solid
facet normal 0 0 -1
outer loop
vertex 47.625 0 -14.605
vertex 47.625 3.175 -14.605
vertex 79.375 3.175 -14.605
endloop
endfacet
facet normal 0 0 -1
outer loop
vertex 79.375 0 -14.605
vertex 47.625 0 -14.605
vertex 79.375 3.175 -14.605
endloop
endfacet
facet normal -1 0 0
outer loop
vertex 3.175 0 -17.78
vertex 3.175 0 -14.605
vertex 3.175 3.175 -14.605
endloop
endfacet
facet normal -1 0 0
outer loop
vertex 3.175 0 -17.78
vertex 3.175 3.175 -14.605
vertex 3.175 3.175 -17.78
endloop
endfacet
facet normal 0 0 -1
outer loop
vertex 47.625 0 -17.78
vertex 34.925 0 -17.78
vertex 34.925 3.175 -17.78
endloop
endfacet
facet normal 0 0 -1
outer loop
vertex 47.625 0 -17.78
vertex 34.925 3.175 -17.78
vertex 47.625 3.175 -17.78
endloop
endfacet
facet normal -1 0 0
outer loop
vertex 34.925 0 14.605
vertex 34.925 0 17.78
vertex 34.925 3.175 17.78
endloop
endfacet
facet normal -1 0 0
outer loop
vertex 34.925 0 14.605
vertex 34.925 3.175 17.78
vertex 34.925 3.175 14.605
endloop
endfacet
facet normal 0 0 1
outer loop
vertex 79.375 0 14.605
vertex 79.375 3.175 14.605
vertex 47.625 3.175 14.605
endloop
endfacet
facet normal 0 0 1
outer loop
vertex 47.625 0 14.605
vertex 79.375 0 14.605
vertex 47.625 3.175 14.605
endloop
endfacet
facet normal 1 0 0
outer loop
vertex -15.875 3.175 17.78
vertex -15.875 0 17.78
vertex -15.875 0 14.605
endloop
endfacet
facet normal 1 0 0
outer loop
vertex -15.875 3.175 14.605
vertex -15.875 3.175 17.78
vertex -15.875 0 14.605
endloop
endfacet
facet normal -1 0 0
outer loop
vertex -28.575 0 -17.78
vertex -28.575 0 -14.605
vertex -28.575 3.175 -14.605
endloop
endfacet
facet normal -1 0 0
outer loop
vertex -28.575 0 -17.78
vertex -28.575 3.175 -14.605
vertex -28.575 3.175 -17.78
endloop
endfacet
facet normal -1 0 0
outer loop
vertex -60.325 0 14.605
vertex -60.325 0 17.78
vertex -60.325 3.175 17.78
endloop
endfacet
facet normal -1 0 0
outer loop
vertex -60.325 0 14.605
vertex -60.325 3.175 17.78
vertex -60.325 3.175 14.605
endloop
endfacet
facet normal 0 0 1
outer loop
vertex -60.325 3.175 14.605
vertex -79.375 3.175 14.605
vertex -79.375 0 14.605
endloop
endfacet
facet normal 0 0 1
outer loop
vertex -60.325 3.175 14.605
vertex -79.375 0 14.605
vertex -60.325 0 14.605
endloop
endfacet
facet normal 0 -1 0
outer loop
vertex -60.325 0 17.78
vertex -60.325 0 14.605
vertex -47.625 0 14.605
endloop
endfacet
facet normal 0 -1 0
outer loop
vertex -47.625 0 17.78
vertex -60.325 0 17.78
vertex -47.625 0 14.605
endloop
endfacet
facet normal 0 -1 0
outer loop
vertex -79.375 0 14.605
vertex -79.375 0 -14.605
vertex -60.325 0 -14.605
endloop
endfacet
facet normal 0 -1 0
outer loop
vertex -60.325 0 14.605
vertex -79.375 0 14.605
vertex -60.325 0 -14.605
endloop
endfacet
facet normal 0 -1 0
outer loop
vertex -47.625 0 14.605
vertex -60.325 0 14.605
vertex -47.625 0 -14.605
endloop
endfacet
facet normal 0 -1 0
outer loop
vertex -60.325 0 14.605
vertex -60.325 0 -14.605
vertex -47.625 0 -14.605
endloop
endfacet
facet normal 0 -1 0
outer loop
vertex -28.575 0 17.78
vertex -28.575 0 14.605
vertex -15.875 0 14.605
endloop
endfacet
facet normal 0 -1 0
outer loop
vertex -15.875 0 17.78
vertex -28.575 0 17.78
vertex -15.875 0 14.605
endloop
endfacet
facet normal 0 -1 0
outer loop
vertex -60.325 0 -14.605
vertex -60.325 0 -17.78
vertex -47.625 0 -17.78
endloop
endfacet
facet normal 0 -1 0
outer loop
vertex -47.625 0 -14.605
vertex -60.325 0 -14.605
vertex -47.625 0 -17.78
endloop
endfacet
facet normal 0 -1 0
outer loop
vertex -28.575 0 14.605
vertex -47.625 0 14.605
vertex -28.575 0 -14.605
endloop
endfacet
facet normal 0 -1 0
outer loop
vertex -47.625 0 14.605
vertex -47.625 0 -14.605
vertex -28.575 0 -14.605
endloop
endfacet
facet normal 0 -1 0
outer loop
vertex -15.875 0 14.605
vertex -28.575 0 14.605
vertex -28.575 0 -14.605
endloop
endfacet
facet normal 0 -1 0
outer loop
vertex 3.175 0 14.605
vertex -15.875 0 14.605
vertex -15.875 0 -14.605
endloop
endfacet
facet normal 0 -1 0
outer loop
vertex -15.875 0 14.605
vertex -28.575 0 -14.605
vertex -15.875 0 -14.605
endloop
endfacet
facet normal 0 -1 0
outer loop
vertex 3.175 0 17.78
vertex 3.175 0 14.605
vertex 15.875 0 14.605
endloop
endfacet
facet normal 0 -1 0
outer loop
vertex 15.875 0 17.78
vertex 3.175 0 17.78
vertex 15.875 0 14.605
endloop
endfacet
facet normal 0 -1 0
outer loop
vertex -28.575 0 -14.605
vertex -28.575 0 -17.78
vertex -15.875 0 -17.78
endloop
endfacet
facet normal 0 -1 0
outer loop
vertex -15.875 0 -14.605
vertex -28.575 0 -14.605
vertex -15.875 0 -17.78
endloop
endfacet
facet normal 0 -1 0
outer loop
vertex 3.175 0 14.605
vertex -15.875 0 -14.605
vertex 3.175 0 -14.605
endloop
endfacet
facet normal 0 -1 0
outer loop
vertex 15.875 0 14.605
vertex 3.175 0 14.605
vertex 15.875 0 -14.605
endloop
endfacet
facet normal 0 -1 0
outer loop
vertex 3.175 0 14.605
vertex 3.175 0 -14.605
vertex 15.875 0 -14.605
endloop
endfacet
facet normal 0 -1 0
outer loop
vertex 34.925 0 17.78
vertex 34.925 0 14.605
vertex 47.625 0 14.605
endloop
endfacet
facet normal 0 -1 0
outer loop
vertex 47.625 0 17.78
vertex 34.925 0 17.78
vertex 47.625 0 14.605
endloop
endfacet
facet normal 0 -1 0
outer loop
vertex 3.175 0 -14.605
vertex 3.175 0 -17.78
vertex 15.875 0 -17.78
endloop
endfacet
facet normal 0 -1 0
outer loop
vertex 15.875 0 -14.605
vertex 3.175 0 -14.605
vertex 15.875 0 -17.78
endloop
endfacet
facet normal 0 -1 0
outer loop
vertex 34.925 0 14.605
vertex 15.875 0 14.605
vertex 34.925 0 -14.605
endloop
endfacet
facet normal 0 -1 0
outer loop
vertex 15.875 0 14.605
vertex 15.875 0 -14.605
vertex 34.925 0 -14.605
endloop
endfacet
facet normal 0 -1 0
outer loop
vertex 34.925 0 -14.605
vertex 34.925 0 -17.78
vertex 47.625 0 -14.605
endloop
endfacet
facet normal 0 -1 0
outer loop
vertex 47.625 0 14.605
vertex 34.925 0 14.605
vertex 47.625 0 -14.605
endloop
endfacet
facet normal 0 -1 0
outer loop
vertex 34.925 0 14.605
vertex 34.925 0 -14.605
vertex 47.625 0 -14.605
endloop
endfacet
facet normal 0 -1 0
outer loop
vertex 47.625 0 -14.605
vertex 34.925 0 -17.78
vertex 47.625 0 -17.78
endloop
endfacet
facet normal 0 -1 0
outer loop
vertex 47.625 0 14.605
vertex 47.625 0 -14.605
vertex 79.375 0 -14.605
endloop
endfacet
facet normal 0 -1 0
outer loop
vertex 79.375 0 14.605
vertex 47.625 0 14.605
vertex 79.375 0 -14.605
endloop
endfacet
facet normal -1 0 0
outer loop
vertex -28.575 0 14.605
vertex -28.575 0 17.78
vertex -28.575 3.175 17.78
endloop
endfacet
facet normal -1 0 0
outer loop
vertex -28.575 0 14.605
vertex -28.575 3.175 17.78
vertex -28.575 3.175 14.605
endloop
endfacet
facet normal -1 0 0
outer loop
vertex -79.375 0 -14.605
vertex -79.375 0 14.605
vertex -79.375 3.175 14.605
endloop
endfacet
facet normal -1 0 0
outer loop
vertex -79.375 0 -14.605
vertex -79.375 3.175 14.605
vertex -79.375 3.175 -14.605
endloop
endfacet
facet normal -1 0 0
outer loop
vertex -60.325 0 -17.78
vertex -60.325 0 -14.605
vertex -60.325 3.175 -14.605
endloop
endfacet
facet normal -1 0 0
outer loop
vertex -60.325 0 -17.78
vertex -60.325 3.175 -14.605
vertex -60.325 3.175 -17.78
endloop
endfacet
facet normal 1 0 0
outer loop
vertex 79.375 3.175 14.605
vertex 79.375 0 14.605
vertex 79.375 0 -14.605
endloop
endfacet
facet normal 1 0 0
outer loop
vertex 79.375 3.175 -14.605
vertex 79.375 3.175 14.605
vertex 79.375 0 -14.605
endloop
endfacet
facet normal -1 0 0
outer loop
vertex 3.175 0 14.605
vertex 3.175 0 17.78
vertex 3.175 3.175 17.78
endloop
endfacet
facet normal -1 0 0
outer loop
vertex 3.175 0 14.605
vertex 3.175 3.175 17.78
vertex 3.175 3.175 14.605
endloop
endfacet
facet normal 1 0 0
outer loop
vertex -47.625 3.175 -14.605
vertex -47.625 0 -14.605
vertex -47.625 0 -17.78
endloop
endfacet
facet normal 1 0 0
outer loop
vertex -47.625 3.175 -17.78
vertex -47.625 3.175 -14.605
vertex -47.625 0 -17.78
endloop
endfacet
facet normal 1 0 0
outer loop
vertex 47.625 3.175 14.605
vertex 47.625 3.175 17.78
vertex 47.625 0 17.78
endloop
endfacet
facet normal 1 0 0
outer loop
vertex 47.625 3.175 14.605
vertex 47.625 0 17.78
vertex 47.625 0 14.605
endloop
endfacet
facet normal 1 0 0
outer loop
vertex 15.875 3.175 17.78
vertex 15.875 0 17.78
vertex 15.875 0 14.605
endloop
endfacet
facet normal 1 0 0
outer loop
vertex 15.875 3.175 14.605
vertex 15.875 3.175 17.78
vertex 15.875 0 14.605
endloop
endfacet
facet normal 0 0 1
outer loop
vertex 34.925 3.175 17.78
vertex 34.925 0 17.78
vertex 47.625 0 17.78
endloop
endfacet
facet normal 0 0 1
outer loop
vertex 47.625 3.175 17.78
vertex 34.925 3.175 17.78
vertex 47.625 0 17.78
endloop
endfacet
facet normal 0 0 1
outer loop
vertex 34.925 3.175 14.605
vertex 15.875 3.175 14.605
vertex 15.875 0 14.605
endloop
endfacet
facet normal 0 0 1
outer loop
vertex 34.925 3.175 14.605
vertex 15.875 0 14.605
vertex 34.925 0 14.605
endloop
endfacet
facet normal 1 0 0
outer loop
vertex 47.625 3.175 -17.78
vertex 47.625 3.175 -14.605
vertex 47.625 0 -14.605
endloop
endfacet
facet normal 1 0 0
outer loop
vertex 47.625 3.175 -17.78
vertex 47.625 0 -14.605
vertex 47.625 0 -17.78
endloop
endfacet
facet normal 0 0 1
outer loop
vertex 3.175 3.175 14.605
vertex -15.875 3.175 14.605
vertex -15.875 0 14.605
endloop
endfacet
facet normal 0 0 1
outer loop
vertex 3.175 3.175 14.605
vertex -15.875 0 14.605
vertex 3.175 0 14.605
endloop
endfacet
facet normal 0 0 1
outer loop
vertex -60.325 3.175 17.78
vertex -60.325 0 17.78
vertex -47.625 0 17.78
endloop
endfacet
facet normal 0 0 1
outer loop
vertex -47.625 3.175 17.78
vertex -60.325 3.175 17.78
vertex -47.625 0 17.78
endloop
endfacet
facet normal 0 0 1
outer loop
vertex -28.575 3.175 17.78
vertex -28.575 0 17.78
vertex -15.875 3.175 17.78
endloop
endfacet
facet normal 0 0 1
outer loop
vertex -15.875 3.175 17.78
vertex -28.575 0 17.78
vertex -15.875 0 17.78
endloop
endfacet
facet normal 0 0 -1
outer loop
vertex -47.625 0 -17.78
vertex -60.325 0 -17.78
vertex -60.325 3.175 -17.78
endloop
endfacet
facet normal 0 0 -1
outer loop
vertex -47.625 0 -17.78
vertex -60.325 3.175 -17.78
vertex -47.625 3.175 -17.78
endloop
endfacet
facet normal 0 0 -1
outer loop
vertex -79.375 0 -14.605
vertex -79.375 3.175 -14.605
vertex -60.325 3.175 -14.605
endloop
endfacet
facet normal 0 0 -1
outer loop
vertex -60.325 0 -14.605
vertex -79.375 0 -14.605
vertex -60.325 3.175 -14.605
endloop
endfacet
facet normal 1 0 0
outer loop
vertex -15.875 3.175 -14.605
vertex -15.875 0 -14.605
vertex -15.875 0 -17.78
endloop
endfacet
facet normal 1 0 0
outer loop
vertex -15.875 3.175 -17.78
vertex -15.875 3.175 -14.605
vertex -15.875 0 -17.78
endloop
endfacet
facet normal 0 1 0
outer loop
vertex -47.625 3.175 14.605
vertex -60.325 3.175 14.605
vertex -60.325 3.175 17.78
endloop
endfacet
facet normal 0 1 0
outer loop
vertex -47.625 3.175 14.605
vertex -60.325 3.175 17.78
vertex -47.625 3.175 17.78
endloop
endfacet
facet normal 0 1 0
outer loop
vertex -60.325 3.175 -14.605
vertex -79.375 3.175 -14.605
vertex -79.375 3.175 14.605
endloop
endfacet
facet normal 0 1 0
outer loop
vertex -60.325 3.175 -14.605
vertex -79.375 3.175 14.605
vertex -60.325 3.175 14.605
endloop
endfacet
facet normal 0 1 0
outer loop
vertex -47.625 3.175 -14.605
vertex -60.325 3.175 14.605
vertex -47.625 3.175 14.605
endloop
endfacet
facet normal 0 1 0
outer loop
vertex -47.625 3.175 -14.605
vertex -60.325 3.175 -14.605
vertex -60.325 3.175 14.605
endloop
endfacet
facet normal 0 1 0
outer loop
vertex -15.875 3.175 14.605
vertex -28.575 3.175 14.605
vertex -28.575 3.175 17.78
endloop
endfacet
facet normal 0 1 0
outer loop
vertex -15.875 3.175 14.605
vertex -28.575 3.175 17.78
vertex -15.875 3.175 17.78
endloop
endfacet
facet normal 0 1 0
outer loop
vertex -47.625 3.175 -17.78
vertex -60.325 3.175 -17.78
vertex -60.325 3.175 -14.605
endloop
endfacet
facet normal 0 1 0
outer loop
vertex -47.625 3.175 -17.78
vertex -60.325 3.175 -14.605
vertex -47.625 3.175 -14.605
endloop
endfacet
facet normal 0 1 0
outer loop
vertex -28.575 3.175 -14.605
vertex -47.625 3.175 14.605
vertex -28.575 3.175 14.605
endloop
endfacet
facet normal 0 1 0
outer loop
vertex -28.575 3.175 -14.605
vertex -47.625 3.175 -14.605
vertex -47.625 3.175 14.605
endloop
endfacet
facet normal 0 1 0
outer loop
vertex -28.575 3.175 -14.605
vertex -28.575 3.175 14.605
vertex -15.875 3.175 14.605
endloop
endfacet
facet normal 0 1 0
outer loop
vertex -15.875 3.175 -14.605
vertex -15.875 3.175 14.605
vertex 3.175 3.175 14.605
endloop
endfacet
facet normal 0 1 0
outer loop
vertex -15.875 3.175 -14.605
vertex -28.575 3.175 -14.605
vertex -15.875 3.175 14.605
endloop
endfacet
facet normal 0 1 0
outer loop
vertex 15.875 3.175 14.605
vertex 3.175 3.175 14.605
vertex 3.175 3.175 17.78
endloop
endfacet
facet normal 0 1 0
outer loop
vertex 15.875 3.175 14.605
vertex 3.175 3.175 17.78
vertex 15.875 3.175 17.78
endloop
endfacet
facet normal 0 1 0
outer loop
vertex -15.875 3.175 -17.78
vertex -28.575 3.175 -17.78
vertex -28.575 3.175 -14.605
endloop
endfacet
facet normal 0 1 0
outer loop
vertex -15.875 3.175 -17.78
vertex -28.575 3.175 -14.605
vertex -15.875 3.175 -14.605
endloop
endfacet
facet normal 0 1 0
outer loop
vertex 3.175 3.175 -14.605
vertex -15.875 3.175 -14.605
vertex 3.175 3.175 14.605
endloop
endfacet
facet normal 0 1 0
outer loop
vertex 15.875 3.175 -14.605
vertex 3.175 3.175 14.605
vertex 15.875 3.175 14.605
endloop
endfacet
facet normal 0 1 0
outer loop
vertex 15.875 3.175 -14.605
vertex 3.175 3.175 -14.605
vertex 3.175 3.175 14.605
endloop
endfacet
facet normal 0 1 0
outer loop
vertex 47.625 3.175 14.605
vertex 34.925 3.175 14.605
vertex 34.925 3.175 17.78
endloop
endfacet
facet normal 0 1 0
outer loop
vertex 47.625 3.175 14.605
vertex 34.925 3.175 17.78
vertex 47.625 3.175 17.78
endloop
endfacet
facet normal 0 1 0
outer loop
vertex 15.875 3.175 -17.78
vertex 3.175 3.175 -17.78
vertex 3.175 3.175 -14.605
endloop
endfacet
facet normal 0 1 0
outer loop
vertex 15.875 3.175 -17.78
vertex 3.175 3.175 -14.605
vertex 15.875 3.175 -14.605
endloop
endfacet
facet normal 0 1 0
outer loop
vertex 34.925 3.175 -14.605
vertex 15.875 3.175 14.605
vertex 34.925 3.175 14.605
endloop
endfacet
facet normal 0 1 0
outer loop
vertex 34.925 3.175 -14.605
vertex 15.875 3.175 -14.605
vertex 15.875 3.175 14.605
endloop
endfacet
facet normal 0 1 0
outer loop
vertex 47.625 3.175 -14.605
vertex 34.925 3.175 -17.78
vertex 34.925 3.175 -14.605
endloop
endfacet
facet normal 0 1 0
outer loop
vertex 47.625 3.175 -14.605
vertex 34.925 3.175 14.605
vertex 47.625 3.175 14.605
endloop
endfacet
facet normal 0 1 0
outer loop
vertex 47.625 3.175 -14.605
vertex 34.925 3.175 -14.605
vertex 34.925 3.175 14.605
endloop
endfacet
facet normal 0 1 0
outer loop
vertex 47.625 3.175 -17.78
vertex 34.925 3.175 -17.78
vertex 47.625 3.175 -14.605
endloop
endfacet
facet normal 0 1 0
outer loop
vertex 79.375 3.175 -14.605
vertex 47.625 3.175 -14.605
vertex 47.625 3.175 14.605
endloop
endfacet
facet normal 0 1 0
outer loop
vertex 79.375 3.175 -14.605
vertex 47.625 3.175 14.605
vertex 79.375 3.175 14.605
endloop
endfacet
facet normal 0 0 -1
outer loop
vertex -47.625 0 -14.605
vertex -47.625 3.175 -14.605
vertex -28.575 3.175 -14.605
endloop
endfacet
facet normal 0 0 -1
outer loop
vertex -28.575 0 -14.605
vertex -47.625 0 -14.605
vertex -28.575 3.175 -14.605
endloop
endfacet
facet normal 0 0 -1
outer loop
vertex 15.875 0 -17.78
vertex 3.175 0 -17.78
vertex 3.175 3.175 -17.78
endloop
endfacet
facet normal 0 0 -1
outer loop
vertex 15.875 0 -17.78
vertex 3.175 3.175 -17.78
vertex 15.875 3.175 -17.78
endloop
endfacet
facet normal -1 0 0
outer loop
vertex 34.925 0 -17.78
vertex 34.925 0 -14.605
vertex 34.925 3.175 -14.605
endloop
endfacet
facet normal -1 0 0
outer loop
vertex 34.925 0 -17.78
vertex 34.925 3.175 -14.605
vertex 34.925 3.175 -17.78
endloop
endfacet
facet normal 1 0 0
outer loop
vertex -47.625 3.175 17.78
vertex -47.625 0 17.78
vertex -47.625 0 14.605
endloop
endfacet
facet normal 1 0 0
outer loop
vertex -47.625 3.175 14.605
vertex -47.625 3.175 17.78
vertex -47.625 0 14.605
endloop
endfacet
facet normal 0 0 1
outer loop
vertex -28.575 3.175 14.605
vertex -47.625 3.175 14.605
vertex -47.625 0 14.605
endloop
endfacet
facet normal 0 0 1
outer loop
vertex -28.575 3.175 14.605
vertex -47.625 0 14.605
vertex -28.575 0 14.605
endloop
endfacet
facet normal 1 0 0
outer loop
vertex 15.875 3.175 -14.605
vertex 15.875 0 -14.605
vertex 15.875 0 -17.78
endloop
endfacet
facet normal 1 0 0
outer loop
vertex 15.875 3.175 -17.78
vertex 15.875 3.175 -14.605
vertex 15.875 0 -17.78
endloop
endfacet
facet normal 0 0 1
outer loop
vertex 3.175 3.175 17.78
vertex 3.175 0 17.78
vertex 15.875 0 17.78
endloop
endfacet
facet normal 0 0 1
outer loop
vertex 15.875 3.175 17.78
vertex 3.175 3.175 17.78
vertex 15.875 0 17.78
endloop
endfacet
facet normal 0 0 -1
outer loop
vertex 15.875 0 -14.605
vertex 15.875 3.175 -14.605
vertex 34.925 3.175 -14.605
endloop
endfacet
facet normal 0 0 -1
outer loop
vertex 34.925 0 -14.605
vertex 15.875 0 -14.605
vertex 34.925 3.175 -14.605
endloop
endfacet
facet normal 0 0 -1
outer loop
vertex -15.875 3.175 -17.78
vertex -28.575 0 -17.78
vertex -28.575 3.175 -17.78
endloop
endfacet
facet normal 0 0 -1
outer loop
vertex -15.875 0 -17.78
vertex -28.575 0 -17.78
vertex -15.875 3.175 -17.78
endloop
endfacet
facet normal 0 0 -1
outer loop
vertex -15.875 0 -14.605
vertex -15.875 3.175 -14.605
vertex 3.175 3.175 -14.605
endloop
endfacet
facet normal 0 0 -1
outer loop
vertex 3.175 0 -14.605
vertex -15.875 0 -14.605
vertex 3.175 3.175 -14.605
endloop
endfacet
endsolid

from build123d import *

# Parameters (mm, degrees)
SKETCH1_W          = 158.75
SKETCH1_H          = 35.56
EXTRUDE1_DEPTH     = 3.175
SKETCH3_W          = 19.05
SKETCH3_H          = 3.175
CUT_EXTRUDE1_DEPTH = 4.175


with BuildPart() as part:
    # Sketch1 → Extrude1 (new body)
    with BuildSketch(Plane(origin=(0, 0, 0), x_dir=(1, 0, 0), z_dir=(0, 1, 0))):
        Rectangle(SKETCH1_W, SKETCH1_H)
    extrude(amount=EXTRUDE1_DEPTH)

    # Sketch3 → Cut-Extrude1 (cut, through all)
    with BuildSketch(Plane(origin=(0, 3.175, 0), x_dir=(1, 0, 0), z_dir=(0, 1, 0))):
        Polygon((47.625, -14.605), (66.675, -14.605), (79.375, -14.605), (79.375, -17.78), (66.675, -17.78), (47.625, -17.78), align=None)
        with Locations((-69.85, 16.1925)):
            Rectangle(SKETCH3_W, SKETCH3_H)
        Polygon((66.675, 17.78), (79.375, 17.78), (79.375, 14.605), (66.675, 14.605), (47.625, 14.605), (47.625, 17.78), align=None)
        with Locations((25.4, -16.1925)):
            Rectangle(SKETCH3_W, SKETCH3_H)
        with Locations((-6.35, -16.1925)):
            Rectangle(SKETCH3_W, SKETCH3_H)
        with Locations((-38.1, -16.1925)):
            Rectangle(SKETCH3_W, SKETCH3_H)
        with Locations((-69.85, -16.1925)):
            Rectangle(SKETCH3_W, SKETCH3_H)
        with Locations((-38.1, 16.1925)):
            Rectangle(SKETCH3_W, SKETCH3_H)
        with Locations((-6.35, 16.1925)):
            Rectangle(SKETCH3_W, SKETCH3_H)
        with Locations((25.4, 16.1925)):
            Rectangle(SKETCH3_W, SKETCH3_H)
    extrude(amount=-CUT_EXTRUDE1_DEPTH, mode=Mode.SUBTRACT)


solid = part.part
